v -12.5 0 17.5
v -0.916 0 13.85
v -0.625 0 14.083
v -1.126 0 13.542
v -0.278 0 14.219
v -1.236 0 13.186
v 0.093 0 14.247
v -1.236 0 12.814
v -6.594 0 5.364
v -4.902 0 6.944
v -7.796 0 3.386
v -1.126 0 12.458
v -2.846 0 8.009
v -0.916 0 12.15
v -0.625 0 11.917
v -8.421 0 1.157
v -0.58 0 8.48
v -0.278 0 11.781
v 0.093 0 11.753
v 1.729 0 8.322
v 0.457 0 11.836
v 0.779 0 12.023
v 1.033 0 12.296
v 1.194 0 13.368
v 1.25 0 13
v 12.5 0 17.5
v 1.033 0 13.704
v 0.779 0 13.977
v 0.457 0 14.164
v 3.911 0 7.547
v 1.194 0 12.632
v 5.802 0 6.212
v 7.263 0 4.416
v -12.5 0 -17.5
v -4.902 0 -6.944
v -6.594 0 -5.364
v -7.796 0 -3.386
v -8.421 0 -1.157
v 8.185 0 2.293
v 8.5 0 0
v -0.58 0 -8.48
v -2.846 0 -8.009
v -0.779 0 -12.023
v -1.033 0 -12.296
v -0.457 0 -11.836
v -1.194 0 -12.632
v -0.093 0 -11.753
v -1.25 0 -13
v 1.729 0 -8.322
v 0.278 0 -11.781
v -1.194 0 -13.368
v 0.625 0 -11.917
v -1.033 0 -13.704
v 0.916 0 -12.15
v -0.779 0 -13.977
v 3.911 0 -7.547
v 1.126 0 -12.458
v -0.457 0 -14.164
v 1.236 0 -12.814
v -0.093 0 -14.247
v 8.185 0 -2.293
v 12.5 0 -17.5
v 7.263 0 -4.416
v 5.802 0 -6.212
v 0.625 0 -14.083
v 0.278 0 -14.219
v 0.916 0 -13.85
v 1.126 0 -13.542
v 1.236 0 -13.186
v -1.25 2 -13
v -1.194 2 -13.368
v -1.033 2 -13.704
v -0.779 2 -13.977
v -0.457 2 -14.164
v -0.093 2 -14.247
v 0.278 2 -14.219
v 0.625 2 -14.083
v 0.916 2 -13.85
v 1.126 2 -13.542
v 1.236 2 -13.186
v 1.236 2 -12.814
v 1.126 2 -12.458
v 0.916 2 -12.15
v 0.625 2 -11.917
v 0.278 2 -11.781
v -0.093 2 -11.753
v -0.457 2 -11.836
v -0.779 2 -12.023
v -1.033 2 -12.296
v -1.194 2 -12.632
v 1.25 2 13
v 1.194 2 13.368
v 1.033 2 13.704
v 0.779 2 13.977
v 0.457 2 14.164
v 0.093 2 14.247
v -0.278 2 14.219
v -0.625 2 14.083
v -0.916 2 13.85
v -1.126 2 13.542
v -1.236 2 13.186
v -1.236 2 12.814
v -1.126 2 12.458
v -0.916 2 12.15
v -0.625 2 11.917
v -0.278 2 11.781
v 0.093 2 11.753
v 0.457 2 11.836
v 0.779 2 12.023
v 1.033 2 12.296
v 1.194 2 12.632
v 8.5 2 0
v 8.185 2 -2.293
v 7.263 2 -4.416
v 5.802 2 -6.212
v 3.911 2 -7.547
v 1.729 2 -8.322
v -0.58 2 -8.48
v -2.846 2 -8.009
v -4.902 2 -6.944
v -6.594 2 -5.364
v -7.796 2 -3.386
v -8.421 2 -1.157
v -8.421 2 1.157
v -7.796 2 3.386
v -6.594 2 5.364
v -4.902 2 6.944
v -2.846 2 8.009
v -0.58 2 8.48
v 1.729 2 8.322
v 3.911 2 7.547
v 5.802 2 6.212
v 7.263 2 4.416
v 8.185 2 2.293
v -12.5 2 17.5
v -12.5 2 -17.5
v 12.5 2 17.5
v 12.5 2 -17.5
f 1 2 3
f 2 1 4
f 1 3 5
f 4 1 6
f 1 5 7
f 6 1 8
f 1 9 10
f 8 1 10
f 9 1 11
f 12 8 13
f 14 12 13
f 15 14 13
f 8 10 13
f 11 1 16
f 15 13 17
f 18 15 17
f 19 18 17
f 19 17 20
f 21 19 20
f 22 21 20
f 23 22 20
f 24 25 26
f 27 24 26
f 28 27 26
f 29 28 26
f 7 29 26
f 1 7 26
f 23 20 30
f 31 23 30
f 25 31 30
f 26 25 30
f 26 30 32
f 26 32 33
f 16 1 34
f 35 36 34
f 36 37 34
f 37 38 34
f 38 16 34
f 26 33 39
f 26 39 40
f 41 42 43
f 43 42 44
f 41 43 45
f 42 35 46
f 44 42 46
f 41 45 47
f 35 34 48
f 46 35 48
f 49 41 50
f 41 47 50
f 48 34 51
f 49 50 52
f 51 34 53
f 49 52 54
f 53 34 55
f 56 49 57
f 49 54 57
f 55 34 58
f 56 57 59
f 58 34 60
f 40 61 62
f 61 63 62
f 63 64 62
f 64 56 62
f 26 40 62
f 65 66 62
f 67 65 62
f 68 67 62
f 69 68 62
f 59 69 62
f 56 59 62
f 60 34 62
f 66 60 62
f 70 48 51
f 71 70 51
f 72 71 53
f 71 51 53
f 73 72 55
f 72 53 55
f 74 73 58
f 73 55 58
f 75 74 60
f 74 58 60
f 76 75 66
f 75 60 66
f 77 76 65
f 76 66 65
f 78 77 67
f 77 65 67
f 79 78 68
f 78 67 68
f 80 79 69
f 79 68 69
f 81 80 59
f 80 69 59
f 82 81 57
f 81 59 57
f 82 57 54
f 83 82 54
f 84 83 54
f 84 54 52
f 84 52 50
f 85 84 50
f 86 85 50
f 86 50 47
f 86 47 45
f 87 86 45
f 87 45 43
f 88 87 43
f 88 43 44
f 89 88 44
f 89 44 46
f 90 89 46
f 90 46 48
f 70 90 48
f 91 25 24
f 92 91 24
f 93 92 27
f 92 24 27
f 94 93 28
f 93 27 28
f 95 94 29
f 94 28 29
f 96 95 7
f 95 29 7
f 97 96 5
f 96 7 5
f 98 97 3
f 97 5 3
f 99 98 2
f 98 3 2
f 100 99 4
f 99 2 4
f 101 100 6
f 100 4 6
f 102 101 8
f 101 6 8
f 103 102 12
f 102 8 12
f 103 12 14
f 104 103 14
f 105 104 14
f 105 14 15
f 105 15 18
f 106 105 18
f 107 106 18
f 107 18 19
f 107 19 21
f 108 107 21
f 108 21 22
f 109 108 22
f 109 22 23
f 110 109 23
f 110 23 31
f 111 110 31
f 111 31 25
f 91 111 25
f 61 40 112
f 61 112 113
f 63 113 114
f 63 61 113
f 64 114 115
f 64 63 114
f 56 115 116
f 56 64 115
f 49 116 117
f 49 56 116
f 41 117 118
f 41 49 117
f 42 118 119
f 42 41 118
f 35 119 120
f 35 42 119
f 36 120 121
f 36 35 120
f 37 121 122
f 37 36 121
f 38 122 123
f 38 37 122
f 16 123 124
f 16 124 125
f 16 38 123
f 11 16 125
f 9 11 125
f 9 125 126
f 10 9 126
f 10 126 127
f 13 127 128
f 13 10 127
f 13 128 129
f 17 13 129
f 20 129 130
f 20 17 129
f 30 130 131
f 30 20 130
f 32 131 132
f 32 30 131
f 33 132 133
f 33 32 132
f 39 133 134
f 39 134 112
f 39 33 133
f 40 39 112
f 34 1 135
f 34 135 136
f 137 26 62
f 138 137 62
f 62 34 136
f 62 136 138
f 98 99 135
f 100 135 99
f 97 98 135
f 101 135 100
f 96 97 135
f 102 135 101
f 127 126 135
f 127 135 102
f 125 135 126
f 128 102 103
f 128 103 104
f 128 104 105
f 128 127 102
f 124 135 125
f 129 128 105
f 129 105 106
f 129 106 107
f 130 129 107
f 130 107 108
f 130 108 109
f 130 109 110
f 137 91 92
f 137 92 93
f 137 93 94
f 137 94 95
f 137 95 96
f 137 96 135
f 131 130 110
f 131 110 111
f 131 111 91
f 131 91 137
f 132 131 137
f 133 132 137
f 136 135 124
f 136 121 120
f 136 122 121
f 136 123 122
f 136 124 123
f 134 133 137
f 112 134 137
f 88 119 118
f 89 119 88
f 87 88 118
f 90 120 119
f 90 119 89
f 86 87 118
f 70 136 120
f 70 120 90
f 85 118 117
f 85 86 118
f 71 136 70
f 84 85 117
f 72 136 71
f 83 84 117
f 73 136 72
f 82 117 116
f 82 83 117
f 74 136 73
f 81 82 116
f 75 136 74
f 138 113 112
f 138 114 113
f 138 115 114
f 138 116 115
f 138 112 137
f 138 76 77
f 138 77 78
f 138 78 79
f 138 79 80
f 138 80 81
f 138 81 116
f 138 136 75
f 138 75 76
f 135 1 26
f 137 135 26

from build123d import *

# Parameters (mm, degrees)
SKETCH_1_W               = 25
SKETCH_1_H               = 35
SKETCH_1_R               = 8.5
EXTRUDE_4_DEPTH          = 2
HOLE_WIZARD_M3_1_D       = 2.5
PATTERN_CIRCULAR_1_COUNT = 2


with BuildPart() as part:
    # 스케치1 → 보스-돌출4 (new body)
    with BuildSketch(Plane(origin=(0, 0, 0), x_dir=(1, 0, 0), z_dir=(0, 1, 0))):
        Rectangle(SKETCH_1_W, SKETCH_1_H)
        Circle(SKETCH_1_R, mode=Mode.SUBTRACT)
    extrude(amount=EXTRUDE_4_DEPTH)

    # M3 탭을 위한 탭 드릴1 (through all)
    with Locations(Plane(origin=(0, 2, 0), x_dir=(1, 0, 0), z_dir=(0, 1, 0))):
        with Locations((0, 13)):
            hole_wizard_m3_1 = Hole(HOLE_WIZARD_M3_1_D / 2)

    # 원형 패턴1: M3 탭을 위한 탭 드릴1 ×2 about axis
    pattern_circular_1_axis = Axis((0, 0, 0), (0, 1, 0))
    for i in range(1, PATTERN_CIRCULAR_1_COUNT):
        add(hole_wizard_m3_1.rotate(pattern_circular_1_axis, i * 360 / PATTERN_CIRCULAR_1_COUNT), mode=Mode.SUBTRACT)


solid = part.part
